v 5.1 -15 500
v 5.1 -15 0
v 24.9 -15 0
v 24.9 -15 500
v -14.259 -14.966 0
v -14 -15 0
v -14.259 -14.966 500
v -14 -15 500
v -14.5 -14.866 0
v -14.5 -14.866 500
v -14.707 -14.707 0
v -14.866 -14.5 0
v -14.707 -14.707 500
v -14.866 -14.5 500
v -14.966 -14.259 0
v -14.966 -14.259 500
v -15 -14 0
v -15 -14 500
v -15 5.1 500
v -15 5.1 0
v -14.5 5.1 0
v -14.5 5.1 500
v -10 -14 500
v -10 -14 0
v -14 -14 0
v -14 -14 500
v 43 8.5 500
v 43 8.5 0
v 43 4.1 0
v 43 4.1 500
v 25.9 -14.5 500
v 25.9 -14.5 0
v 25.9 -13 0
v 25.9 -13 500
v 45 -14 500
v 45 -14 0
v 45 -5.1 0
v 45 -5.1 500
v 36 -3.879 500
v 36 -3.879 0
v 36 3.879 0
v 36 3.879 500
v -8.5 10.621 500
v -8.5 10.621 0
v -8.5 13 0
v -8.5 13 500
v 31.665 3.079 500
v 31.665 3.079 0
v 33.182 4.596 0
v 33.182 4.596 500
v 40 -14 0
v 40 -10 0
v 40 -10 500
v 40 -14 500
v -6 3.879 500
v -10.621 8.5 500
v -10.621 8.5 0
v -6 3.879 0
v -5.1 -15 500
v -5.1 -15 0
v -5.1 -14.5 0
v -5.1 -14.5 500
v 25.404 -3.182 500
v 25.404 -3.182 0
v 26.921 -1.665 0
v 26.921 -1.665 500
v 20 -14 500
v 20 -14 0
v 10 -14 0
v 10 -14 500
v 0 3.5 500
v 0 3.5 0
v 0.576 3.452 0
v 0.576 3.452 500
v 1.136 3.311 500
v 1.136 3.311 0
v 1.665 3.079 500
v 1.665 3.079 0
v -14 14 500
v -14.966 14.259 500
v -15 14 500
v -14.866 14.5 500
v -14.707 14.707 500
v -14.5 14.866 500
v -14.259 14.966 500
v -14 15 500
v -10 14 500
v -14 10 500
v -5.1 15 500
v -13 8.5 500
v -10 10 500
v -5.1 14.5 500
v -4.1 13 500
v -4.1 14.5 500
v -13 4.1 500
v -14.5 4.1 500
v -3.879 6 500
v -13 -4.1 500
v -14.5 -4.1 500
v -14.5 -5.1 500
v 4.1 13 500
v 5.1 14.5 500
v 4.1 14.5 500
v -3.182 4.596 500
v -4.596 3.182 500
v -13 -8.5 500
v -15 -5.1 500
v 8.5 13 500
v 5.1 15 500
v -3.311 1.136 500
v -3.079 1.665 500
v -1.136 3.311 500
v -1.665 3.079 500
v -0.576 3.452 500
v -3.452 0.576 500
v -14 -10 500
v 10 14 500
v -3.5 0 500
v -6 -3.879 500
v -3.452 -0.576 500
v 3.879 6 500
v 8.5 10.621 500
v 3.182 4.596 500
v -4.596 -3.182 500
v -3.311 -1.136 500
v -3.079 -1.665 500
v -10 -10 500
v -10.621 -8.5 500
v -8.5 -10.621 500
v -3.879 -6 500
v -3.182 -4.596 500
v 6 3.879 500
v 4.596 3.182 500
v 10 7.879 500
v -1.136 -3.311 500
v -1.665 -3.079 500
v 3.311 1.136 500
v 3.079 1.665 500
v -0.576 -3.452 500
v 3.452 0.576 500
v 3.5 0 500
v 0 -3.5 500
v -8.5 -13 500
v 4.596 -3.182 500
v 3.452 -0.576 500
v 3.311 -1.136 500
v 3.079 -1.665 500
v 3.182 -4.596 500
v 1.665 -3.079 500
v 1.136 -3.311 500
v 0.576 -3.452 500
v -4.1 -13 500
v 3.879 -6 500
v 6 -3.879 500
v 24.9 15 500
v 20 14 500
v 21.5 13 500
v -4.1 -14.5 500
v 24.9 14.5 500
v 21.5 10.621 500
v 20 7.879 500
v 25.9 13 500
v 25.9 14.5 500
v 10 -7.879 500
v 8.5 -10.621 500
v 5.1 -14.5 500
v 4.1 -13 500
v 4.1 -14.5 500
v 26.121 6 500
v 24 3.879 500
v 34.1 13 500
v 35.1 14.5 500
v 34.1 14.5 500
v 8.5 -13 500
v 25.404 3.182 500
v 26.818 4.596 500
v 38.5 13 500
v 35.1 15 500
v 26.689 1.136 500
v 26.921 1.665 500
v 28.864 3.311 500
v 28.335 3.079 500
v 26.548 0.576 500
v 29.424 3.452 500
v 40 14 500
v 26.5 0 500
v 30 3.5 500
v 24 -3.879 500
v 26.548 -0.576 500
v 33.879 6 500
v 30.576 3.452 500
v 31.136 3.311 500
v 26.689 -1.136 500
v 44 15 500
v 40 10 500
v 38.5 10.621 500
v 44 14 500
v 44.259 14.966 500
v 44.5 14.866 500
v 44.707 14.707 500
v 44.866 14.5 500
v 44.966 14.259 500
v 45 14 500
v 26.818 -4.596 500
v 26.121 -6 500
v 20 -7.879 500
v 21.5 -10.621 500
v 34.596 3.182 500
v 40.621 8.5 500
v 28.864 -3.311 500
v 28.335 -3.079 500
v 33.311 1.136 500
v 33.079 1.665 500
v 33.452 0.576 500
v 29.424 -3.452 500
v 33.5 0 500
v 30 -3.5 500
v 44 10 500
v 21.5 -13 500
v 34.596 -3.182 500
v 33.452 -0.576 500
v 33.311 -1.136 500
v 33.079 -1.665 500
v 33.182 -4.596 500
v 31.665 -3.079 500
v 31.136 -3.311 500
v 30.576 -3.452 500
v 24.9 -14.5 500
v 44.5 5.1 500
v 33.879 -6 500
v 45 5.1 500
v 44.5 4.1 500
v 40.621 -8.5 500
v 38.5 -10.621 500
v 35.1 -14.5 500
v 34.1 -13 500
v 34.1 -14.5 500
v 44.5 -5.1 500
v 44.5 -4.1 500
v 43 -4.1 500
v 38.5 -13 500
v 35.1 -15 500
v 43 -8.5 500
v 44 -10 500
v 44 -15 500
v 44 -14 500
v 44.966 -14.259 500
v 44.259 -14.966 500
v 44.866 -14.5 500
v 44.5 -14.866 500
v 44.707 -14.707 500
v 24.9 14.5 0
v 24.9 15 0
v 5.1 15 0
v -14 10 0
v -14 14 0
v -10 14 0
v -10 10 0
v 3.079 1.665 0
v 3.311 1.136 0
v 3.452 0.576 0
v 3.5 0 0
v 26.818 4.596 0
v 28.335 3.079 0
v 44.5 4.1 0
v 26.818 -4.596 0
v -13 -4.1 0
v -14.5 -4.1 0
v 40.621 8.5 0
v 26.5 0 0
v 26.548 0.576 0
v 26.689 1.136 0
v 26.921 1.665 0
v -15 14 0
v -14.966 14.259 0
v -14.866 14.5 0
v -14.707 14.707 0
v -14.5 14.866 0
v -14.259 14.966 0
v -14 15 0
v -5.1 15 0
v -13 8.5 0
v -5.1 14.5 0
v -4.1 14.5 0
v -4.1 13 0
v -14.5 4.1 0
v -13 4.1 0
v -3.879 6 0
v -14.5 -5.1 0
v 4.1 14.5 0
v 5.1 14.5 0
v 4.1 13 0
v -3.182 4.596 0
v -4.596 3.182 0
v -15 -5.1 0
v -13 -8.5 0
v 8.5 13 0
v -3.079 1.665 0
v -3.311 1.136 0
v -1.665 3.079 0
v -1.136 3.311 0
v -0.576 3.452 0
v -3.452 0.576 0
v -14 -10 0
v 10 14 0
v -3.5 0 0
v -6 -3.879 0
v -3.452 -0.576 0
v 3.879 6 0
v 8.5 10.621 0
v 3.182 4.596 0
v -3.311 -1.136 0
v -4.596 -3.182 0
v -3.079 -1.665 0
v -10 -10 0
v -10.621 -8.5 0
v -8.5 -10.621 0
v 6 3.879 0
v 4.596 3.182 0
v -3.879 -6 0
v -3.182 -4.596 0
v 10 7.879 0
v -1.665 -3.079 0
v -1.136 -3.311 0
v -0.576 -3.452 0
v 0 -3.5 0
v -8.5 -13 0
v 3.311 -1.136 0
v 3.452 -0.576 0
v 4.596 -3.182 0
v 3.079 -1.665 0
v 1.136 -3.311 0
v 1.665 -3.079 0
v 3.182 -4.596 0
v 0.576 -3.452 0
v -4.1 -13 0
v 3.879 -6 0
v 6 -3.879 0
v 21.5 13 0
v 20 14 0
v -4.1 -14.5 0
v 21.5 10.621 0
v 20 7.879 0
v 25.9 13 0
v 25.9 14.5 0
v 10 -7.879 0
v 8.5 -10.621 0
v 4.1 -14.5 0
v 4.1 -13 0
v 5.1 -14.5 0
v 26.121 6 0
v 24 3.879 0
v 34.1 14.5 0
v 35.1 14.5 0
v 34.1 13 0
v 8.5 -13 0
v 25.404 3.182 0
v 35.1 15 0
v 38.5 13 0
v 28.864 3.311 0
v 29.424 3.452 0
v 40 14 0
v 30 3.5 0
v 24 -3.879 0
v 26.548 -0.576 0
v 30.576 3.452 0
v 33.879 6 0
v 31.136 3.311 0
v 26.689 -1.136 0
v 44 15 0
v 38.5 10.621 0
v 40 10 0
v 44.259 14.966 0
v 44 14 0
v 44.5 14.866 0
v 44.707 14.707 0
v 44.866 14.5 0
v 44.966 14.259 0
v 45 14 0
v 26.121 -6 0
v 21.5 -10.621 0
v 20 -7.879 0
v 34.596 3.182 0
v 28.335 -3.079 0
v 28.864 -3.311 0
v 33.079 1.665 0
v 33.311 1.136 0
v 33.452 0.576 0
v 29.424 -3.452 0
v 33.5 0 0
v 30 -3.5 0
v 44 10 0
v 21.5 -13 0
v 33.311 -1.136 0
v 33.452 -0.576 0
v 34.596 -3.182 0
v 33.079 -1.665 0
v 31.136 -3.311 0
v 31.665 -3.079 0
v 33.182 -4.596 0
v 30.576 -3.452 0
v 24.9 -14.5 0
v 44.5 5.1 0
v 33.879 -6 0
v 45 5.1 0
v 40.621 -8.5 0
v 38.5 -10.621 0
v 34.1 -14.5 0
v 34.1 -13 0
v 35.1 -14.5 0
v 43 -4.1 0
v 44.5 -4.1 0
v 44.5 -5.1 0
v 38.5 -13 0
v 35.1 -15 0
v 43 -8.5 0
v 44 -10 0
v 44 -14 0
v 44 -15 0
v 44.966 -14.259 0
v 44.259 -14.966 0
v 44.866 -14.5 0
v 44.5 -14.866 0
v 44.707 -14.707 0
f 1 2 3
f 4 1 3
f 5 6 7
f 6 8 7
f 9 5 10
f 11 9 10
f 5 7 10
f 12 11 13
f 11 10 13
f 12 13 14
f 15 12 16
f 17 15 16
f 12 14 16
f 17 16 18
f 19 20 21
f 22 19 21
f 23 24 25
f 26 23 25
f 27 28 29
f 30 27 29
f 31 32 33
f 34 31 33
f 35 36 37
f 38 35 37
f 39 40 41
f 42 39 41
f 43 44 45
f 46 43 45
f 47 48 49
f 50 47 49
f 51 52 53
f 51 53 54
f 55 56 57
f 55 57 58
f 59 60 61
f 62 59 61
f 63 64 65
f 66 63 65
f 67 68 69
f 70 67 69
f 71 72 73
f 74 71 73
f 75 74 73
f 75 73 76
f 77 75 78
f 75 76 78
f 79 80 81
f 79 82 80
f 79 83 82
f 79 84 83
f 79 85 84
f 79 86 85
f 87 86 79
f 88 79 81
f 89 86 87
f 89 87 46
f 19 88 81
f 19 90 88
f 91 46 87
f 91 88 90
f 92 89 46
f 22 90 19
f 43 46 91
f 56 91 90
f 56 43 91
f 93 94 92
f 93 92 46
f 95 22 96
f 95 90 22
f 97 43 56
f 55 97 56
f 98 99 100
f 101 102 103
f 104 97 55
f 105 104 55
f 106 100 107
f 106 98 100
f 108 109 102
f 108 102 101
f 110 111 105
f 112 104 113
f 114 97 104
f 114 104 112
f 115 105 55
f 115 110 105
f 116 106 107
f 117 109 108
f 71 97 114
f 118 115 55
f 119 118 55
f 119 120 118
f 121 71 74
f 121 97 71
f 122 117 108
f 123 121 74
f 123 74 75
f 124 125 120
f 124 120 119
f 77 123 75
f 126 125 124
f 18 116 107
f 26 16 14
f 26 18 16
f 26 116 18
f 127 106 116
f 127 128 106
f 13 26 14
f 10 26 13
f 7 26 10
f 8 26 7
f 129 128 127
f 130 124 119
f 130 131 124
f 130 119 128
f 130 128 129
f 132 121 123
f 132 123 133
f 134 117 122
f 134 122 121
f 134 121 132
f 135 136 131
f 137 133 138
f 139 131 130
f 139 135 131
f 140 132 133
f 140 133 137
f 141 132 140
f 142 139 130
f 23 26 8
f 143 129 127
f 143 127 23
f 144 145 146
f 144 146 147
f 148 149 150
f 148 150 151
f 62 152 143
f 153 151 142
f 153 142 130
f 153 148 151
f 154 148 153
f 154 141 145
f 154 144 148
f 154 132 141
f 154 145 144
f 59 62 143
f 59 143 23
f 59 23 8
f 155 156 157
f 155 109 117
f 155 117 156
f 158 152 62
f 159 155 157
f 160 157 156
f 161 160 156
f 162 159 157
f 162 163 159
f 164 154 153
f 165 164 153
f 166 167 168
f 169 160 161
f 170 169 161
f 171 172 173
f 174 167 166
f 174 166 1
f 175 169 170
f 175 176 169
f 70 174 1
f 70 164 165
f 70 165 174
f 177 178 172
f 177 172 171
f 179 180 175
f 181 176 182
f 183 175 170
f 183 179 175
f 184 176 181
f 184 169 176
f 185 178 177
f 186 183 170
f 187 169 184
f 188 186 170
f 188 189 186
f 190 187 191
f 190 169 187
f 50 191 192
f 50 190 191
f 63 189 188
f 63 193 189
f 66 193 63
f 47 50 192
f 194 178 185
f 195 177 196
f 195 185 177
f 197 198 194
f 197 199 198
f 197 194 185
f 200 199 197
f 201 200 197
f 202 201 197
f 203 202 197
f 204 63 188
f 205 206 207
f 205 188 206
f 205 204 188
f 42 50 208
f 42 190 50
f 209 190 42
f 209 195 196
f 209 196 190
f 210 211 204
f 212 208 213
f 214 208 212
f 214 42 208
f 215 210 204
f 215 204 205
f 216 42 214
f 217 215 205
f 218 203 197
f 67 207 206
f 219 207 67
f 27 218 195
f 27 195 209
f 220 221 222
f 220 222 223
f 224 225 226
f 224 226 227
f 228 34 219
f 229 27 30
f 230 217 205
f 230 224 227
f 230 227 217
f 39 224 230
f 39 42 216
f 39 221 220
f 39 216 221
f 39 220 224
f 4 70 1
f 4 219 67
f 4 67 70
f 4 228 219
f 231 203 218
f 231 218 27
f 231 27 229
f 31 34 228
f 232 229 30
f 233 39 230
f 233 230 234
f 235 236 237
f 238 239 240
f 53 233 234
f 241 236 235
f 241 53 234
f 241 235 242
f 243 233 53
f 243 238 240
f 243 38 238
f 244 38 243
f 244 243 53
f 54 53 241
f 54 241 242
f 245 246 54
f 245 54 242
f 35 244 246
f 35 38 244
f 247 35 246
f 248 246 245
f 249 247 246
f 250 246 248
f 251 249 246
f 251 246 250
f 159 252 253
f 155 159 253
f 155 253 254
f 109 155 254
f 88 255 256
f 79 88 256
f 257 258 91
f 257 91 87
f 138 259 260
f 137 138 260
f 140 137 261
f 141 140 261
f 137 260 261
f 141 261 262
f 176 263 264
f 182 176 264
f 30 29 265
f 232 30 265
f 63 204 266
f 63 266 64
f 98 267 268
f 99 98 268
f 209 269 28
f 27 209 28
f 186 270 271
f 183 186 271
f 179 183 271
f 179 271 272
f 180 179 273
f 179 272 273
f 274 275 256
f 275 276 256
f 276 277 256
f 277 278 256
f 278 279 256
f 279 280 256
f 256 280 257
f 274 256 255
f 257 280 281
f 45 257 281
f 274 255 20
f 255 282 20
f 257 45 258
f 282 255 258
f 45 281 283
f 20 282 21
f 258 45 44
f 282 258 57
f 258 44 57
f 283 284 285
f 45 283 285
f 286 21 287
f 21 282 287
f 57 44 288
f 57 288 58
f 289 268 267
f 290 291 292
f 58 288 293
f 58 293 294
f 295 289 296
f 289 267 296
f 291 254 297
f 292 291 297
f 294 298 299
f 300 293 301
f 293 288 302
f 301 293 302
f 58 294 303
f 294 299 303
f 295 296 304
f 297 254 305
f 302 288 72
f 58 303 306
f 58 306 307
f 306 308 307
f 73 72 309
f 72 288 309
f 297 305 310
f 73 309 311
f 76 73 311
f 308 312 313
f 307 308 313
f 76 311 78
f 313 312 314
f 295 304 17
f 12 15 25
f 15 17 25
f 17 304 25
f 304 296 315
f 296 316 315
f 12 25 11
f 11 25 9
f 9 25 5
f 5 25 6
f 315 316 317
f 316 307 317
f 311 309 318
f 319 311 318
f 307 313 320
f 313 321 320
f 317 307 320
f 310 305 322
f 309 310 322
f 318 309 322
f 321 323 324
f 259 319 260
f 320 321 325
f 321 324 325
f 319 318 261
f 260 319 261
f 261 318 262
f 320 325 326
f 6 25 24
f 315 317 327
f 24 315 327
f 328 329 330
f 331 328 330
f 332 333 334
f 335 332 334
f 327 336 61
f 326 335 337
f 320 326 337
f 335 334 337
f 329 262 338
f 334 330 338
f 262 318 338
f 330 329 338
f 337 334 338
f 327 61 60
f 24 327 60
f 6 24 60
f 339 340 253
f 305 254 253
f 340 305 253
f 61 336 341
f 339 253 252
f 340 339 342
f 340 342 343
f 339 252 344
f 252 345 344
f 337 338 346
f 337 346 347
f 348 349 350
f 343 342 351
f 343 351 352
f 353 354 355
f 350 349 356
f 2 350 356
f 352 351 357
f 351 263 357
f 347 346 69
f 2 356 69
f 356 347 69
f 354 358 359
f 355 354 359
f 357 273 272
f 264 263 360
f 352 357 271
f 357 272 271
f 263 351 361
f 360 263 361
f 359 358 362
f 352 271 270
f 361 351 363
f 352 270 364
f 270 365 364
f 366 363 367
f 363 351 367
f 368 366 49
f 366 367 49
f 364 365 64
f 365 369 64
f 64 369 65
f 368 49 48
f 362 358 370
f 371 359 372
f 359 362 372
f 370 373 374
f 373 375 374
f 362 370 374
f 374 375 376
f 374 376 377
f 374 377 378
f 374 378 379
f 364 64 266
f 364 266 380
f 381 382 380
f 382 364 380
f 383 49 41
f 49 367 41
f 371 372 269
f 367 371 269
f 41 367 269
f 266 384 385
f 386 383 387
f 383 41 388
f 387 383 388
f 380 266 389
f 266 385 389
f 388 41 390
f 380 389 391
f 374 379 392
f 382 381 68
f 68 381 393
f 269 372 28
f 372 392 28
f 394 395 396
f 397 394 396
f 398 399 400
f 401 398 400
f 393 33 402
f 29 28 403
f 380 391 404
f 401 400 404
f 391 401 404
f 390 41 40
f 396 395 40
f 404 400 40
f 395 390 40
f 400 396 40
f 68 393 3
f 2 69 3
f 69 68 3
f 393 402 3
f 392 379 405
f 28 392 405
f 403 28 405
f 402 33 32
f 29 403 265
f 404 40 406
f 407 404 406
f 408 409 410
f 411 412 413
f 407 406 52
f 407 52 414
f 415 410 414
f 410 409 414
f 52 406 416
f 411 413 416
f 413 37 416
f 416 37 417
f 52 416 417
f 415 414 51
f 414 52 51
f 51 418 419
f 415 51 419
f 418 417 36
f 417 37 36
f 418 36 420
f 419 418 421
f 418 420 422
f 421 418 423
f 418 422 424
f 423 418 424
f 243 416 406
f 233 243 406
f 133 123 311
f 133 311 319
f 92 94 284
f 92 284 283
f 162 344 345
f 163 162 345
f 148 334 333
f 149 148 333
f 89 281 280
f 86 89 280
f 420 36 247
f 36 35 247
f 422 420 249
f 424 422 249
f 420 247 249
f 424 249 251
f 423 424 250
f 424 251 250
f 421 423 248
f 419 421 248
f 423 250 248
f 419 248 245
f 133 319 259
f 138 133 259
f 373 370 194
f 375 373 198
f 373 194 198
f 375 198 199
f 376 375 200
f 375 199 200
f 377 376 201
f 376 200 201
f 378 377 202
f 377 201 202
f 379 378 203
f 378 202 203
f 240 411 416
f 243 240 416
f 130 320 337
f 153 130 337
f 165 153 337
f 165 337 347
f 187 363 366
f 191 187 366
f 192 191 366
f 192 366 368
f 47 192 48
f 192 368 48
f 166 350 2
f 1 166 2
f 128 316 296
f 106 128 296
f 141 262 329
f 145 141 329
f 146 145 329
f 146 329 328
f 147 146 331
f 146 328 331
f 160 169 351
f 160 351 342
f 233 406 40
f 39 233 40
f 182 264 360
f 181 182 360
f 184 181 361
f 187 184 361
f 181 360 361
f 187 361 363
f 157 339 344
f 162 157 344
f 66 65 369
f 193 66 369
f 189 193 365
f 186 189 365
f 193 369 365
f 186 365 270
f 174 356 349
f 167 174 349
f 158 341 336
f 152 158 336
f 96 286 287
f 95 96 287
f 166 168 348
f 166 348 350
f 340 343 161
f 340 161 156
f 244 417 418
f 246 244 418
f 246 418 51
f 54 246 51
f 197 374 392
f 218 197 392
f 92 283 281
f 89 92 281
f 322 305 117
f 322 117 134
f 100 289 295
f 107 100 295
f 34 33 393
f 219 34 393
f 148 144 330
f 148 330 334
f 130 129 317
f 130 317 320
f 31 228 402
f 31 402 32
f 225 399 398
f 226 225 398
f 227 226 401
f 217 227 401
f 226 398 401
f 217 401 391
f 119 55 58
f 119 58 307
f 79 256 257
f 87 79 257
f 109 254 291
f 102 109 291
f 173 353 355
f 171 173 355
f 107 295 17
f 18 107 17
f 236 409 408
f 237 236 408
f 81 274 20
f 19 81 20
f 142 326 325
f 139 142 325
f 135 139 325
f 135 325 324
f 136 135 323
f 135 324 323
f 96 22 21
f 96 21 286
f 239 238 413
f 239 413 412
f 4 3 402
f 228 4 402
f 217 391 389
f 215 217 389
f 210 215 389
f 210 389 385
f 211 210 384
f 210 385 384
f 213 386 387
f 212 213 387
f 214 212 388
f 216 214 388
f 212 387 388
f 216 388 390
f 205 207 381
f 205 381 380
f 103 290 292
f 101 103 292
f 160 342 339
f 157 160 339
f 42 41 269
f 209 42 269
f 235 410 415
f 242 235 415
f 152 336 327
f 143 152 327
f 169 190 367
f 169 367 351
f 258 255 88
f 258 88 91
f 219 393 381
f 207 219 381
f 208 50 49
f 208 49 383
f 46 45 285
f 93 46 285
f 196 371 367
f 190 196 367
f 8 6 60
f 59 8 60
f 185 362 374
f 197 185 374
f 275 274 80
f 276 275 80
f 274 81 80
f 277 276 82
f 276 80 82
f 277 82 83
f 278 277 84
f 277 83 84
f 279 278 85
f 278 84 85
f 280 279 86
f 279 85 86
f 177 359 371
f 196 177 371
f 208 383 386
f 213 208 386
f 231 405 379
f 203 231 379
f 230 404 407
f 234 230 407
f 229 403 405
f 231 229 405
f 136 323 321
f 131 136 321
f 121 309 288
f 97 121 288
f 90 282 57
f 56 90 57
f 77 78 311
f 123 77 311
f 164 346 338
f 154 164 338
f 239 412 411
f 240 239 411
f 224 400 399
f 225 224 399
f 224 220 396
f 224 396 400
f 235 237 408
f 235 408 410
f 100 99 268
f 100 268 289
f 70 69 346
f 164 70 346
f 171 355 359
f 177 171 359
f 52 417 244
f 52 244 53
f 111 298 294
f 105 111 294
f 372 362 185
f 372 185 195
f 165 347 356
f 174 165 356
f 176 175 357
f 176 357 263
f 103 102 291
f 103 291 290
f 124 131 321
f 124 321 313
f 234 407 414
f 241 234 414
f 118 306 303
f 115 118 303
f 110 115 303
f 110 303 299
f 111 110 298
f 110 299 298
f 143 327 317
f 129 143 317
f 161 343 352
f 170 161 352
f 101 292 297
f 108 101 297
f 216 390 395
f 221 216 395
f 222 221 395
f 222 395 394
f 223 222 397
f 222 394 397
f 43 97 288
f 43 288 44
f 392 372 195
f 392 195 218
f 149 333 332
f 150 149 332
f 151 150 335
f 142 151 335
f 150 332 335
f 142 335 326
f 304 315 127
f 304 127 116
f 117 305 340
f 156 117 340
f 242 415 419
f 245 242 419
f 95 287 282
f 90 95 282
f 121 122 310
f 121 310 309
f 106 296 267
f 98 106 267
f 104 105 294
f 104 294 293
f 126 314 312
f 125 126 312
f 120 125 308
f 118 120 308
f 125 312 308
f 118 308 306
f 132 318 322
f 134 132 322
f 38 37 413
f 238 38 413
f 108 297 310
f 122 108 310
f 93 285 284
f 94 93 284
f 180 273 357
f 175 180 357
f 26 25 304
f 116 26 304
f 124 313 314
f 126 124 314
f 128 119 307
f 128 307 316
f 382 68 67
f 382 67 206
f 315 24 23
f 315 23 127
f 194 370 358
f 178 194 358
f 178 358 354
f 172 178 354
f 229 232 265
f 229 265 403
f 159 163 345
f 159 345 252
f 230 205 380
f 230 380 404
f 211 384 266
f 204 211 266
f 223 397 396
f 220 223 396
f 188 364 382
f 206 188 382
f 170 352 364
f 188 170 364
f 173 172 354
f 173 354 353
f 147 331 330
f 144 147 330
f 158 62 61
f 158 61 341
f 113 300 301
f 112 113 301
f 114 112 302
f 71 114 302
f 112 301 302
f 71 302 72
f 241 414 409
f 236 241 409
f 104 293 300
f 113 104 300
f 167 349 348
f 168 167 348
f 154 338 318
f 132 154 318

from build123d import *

# Parameters (mm, degrees)
ESBO_O1_W                      = 4
ESBO_O1_H                      = 4
RESSALTO_EXTRUS_O1_DEPTH       = 500
PADR_OCIRCULAR1_COUNT          = 4
PADR_O_LINEAR1_COUNT           = 2
PADR_O_LINEAR1_PITCH           = 30
PADR_O_LINEAR1_COPY_1_SKETCH_W = 4
PADR_O_LINEAR1_COPY_1_SKETCH_H = 4
PADR_O_LINEAR1_COPY_1_DEPTH    = 500
PADR_O_LINEAR1_COPY_2_SKETCH_W = 4
PADR_O_LINEAR1_COPY_2_SKETCH_H = 4
PADR_O_LINEAR1_COPY_2_DEPTH    = 500
PADR_O_LINEAR1_COPY_3_SKETCH_W = 4
PADR_O_LINEAR1_COPY_3_SKETCH_H = 4
PADR_O_LINEAR1_COPY_3_DEPTH    = 500
ESBO_O4_W                      = 10
ESBO_O4_H                      = 28
CORTE_EXTRUS_O1_DEPTH          = 503.244960154
FILETE1_R                      = 1


with BuildPart() as part:
    # Esboço1 → Ressalto-extrusão1 (new body)
    with BuildSketch(Plane.XY):
        with BuildLine():
            ThreePointArc((-1.664601464, 3.078815026), (-0.858529967, 3.393070335), (0, 3.5))
            Line((0, 3.5), (0, 6))
            Line((0, 6), (-3.878679656, 6))
            Line((-3.878679656, 6), (-8.5, 10.621320344))
            Line((-8.5, 10.621320344), (-8.5, 13))
            Line((-8.5, 13), (-4.1, 13))
            Line((-4.1, 13), (-4.1, 14.5))
            Line((-4.1, 14.5), (-5.1, 14.5))
            Line((-5.1, 14.5), (-5.1, 15))
            Line((-5.1, 15), (-15, 15))
            Line((-15, 15), (-15, 5.1))
            Line((-15, 5.1), (-14.5, 5.1))
            Line((-14.5, 5.1), (-14.5, 4.1))
            Line((-14.5, 4.1), (-13, 4.1))
            Line((-13, 4.1), (-13, 8.5))
            Line((-13, 8.5), (-10.621320344, 8.5))
            Line((-10.621320344, 8.5), (-6, 3.878679656))
            Line((-6, 3.878679656), (-6, 0))
            Line((-6, 0), (-3.5, 0))
            ThreePointArc((-3.5, 0), (-3.393070335, 0.858529967), (-3.078815026, 1.664601464))
            Line((-3.078815026, 1.664601464), (-4.596194078, 3.181980515))
            Line((-4.596194078, 3.181980515), (-3.181980515, 4.596194078))
            Line((-3.181980515, 4.596194078), (-1.664601464, 3.078815026))
        make_face()
        with Locations((-12, 12)):
            Rectangle(ESBO_O1_W, ESBO_O1_H, mode=Mode.SUBTRACT)
    ressalto_extrus_o1 = extrude(amount=RESSALTO_EXTRUS_O1_DEPTH)

    # PadrãoCircular1: Ressalto-extrusão1 ×4 about axis
    padr_ocircular1_axis = Axis((0, 0, 0), (0, 0, 1))
    for i in range(1, PADR_OCIRCULAR1_COUNT):
        add(ressalto_extrus_o1.rotate(padr_ocircular1_axis, i * 360 / PADR_OCIRCULAR1_COUNT))

    # Padrão linear1: Ressalto-extrusão1 ×2
    with Locations(*[(i * PADR_O_LINEAR1_PITCH, 0, 0) for i in range(1, PADR_O_LINEAR1_COUNT)]):
        add(ressalto_extrus_o1)

    # Padrão linear1 copy 1 sketch → Padrão linear1 copy 1 (add)
    with BuildSketch(Plane(origin=(30, 0, 0), x_dir=(0, 1, 0), z_dir=(0, 0, 1))):
        with BuildLine():
            ThreePointArc((-1.664601464, 3.078815026), (-0.858529967, 3.393070335), (0, 3.5))
            Line((0, 3.5), (0, 6))
            Line((0, 6), (-3.878679656, 6))
            Line((-3.878679656, 6), (-8.5, 10.621320344))
            Line((-8.5, 10.621320344), (-8.5, 13))
            Line((-8.5, 13), (-4.1, 13))
            Line((-4.1, 13), (-4.1, 14.5))
            Line((-4.1, 14.5), (-5.1, 14.5))
            Line((-5.1, 14.5), (-5.1, 15))
            Line((-5.1, 15), (-15, 15))
            Line((-15, 15), (-15, 5.1))
            Line((-15, 5.1), (-14.5, 5.1))
            Line((-14.5, 5.1), (-14.5, 4.1))
            Line((-14.5, 4.1), (-13, 4.1))
            Line((-13, 4.1), (-13, 8.5))
            Line((-13, 8.5), (-10.621320344, 8.5))
            Line((-10.621320344, 8.5), (-6, 3.878679656))
            Line((-6, 3.878679656), (-6, 0))
            Line((-6, 0), (-3.5, 0))
            ThreePointArc((-3.5, 0), (-3.393070335, 0.858529967), (-3.078815026, 1.664601464))
            Line((-3.078815026, 1.664601464), (-4.596194078, 3.181980515))
            Line((-4.596194078, 3.181980515), (-3.181980515, 4.596194078))
            Line((-3.181980515, 4.596194078), (-1.664601464, 3.078815026))
        make_face()
        with Locations((-12, 12)):
            Rectangle(PADR_O_LINEAR1_COPY_1_SKETCH_W, PADR_O_LINEAR1_COPY_1_SKETCH_H, mode=Mode.SUBTRACT)
    extrude(amount=PADR_O_LINEAR1_COPY_1_DEPTH)

    # Padrão linear1 copy 2 sketch → Padrão linear1 copy 2 (add)
    with BuildSketch(Plane(origin=(30, 0, 0), x_dir=(-1, 0, 0), z_dir=(0, 0, 1))):
        with BuildLine():
            ThreePointArc((-1.664601464, 3.078815026), (-0.858529967, 3.393070335), (0, 3.5))
            Line((0, 3.5), (0, 6))
            Line((0, 6), (-3.878679656, 6))
            Line((-3.878679656, 6), (-8.5, 10.621320344))
            Line((-8.5, 10.621320344), (-8.5, 13))
            Line((-8.5, 13), (-4.1, 13))
            Line((-4.1, 13), (-4.1, 14.5))
            Line((-4.1, 14.5), (-5.1, 14.5))
            Line((-5.1, 14.5), (-5.1, 15))
            Line((-5.1, 15), (-15, 15))
            Line((-15, 15), (-15, 5.1))
            Line((-15, 5.1), (-14.5, 5.1))
            Line((-14.5, 5.1), (-14.5, 4.1))
            Line((-14.5, 4.1), (-13, 4.1))
            Line((-13, 4.1), (-13, 8.5))
            Line((-13, 8.5), (-10.621320344, 8.5))
            Line((-10.621320344, 8.5), (-6, 3.878679656))
            Line((-6, 3.878679656), (-6, 0))
            Line((-6, 0), (-3.5, 0))
            ThreePointArc((-3.5, 0), (-3.393070335, 0.858529967), (-3.078815026, 1.664601464))
            Line((-3.078815026, 1.664601464), (-4.596194078, 3.181980515))
            Line((-4.596194078, 3.181980515), (-3.181980515, 4.596194078))
            Line((-3.181980515, 4.596194078), (-1.664601464, 3.078815026))
        make_face()
        with Locations((-12, 12)):
            Rectangle(PADR_O_LINEAR1_COPY_2_SKETCH_W, PADR_O_LINEAR1_COPY_2_SKETCH_H, mode=Mode.SUBTRACT)
    extrude(amount=PADR_O_LINEAR1_COPY_2_DEPTH)

    # Padrão linear1 copy 3 sketch → Padrão linear1 copy 3 (add)
    with BuildSketch(Plane(origin=(30, 0, 0), x_dir=(0, -1, 0), z_dir=(0, 0, 1))):
        with BuildLine():
            ThreePointArc((-1.664601464, 3.078815026), (-0.858529967, 3.393070335), (0, 3.5))
            Line((0, 3.5), (0, 6))
            Line((0, 6), (-3.878679656, 6))
            Line((-3.878679656, 6), (-8.5, 10.621320344))
            Line((-8.5, 10.621320344), (-8.5, 13))
            Line((-8.5, 13), (-4.1, 13))
            Line((-4.1, 13), (-4.1, 14.5))
            Line((-4.1, 14.5), (-5.1, 14.5))
            Line((-5.1, 14.5), (-5.1, 15))
            Line((-5.1, 15), (-15, 15))
            Line((-15, 15), (-15, 5.1))
            Line((-15, 5.1), (-14.5, 5.1))
            Line((-14.5, 5.1), (-14.5, 4.1))
            Line((-14.5, 4.1), (-13, 4.1))
            Line((-13, 4.1), (-13, 8.5))
            Line((-13, 8.5), (-10.621320344, 8.5))
            Line((-10.621320344, 8.5), (-6, 3.878679656))
            Line((-6, 3.878679656), (-6, 0))
            Line((-6, 0), (-3.5, 0))
            ThreePointArc((-3.5, 0), (-3.393070335, 0.858529967), (-3.078815026, 1.664601464))
            Line((-3.078815026, 1.664601464), (-4.596194078, 3.181980515))
            Line((-4.596194078, 3.181980515), (-3.181980515, 4.596194078))
            Line((-3.181980515, 4.596194078), (-1.664601464, 3.078815026))
        make_face()
        with Locations((-12, 12)):
            Rectangle(PADR_O_LINEAR1_COPY_3_SKETCH_W, PADR_O_LINEAR1_COPY_3_SKETCH_H, mode=Mode.SUBTRACT)
    extrude(amount=PADR_O_LINEAR1_COPY_3_DEPTH)

    # Esboço4 → Corte-extrusão1 (cut, through all)
    with BuildSketch(Plane(origin=(0, 0, 0), x_dir=(-1, 0, 0), z_dir=(0, 0, -1))):
        with Locations((-15, 0)):
            Rectangle(ESBO_O4_W, ESBO_O4_H)
    extrude(amount=-CORTE_EXTRUS_O1_DEPTH, mode=Mode.SUBTRACT)

    # Filete1
    filete1_edges = [part.edges().sort_by_distance(p)[0] for p in [
        (45, -15, 250),
        (45, 15, 250),
        (-15, 15, 250),
        (-15, -15, 250),
    ]]
    fillet(filete1_edges, radius=FILETE1_R)


solid = part.part
